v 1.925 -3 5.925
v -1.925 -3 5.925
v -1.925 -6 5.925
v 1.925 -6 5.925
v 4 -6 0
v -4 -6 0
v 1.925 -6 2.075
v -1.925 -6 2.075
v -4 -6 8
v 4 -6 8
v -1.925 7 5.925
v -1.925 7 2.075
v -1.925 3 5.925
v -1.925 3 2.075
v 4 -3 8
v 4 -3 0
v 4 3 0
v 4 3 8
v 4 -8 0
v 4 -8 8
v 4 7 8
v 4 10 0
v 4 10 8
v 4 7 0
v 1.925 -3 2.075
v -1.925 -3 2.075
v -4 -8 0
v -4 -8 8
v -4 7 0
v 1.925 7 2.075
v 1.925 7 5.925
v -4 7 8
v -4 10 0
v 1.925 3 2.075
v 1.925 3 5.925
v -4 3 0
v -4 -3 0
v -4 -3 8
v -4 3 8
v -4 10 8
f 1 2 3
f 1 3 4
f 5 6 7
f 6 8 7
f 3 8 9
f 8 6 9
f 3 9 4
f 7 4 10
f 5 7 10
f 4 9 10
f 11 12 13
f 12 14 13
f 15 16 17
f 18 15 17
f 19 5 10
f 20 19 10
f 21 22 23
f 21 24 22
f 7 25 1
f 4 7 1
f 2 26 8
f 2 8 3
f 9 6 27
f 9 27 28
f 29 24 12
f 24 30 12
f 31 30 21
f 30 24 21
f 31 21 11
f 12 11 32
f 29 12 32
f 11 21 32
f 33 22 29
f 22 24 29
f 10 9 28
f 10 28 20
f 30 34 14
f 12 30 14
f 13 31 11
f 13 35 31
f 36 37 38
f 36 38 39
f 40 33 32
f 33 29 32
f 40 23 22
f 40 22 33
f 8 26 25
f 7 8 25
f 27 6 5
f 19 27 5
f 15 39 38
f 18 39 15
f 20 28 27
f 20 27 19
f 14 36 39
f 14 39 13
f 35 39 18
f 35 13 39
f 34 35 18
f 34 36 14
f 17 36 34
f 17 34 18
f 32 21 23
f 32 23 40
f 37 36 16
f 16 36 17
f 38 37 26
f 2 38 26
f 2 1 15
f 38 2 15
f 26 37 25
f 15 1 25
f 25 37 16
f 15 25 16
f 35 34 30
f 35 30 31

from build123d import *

# Parameters (mm, degrees)
F0_W      = 8
F0_H      = 6
F1_DEPTH  = 8
F2_W      = 3.85
F2_H      = 3.85
F3_DEPTH  = 3
F4_W      = 8
F4_H      = 8
F4_W_2    = 3.85
F4_H_2    = 3.85
F5_DEPTH  = 2
F7_W      = 3.85
F7_H      = 3.85
F8_DEPTH  = 3
F9_W      = 8
F9_H      = 8
F9_W_2    = 3.85
F9_H_2    = 3.85
F10_DEPTH = 2.35
F11_DEPTH = 0.35
F12_DEPTH = 1
F13_DEPTH = 0.65
F14_DEPTH = 1


with BuildPart() as f1:
    # F0 (on Top) → F1 (new body)
    with BuildSketch(Plane.XY):
        Rectangle(F0_W, F0_H)
    extrude(amount=F1_DEPTH)

    # F2 (on face) → F3 (join)
    with BuildSketch(Plane.XZ.offset(3)):
        with Locations((0, 4)):
            Rectangle(F2_W, F2_H)
    extrude(amount=F3_DEPTH)

    # F4 (on face) → F5 (join)
    with BuildSketch(Plane.XZ.offset(6)):
        with Locations((0, 4)):
            Rectangle(F4_W, F4_H)
        with Locations((0, 4)):
            Rectangle(F4_W_2, F4_H_2, mode=Mode.SUBTRACT)
        with Locations((0, 4)):
            Rectangle(F4_W_2, F4_H_2)
    extrude(amount=F5_DEPTH)

    # F7 (on face) → F8 (join)
    with BuildSketch(Plane(origin=(0, 3, 0), x_dir=(-1, 0, 0), z_dir=(0, 1, 0))):
        with Locations((0, 4)):
            Rectangle(F7_W, F7_H)
    extrude(amount=F8_DEPTH)

    # F9 (on face) → F10 (join)
    with BuildSketch(Plane(origin=(0, 6, 0), x_dir=(-1, 0, 0), z_dir=(0, 1, 0))):
        with Locations((0, 4)):
            Rectangle(F9_W, F9_H)
        with Locations((0, 4)):
            Rectangle(F9_W_2, F9_H_2, mode=Mode.SUBTRACT)
        with Locations((0, 4)):
            Rectangle(F9_W_2, F9_H_2)
    extrude(amount=F10_DEPTH)

    # F11 (add): a face of the model
    f11_faces = [f1.faces().sort_by_distance(p)[0] for p in [
        (-3.886862915, 6, 4),
    ]]
    extrude(f11_faces, amount=-F11_DEPTH)

    # F12 (cut): a face of the model
    f12_faces = [f1.faces().sort_by_distance(p)[0] for p in [
        (-3.886862915, 6, 4),
    ]]
    extrude(f12_faces, amount=-F12_DEPTH, mode=Mode.SUBTRACT)

    # F13 (add): a face of the model
    f13_faces = [f1.faces().sort_by_distance(p)[0] for p in [
        (0, 8.35, 4),
    ]]
    extrude(f13_faces, amount=F13_DEPTH)

    # F14 (add): a face of the model
    f14_faces = [f1.faces().sort_by_distance(p)[0] for p in [
        (0, 9, 4),
    ]]
    extrude(f14_faces, amount=F14_DEPTH)


solid = f1.part
